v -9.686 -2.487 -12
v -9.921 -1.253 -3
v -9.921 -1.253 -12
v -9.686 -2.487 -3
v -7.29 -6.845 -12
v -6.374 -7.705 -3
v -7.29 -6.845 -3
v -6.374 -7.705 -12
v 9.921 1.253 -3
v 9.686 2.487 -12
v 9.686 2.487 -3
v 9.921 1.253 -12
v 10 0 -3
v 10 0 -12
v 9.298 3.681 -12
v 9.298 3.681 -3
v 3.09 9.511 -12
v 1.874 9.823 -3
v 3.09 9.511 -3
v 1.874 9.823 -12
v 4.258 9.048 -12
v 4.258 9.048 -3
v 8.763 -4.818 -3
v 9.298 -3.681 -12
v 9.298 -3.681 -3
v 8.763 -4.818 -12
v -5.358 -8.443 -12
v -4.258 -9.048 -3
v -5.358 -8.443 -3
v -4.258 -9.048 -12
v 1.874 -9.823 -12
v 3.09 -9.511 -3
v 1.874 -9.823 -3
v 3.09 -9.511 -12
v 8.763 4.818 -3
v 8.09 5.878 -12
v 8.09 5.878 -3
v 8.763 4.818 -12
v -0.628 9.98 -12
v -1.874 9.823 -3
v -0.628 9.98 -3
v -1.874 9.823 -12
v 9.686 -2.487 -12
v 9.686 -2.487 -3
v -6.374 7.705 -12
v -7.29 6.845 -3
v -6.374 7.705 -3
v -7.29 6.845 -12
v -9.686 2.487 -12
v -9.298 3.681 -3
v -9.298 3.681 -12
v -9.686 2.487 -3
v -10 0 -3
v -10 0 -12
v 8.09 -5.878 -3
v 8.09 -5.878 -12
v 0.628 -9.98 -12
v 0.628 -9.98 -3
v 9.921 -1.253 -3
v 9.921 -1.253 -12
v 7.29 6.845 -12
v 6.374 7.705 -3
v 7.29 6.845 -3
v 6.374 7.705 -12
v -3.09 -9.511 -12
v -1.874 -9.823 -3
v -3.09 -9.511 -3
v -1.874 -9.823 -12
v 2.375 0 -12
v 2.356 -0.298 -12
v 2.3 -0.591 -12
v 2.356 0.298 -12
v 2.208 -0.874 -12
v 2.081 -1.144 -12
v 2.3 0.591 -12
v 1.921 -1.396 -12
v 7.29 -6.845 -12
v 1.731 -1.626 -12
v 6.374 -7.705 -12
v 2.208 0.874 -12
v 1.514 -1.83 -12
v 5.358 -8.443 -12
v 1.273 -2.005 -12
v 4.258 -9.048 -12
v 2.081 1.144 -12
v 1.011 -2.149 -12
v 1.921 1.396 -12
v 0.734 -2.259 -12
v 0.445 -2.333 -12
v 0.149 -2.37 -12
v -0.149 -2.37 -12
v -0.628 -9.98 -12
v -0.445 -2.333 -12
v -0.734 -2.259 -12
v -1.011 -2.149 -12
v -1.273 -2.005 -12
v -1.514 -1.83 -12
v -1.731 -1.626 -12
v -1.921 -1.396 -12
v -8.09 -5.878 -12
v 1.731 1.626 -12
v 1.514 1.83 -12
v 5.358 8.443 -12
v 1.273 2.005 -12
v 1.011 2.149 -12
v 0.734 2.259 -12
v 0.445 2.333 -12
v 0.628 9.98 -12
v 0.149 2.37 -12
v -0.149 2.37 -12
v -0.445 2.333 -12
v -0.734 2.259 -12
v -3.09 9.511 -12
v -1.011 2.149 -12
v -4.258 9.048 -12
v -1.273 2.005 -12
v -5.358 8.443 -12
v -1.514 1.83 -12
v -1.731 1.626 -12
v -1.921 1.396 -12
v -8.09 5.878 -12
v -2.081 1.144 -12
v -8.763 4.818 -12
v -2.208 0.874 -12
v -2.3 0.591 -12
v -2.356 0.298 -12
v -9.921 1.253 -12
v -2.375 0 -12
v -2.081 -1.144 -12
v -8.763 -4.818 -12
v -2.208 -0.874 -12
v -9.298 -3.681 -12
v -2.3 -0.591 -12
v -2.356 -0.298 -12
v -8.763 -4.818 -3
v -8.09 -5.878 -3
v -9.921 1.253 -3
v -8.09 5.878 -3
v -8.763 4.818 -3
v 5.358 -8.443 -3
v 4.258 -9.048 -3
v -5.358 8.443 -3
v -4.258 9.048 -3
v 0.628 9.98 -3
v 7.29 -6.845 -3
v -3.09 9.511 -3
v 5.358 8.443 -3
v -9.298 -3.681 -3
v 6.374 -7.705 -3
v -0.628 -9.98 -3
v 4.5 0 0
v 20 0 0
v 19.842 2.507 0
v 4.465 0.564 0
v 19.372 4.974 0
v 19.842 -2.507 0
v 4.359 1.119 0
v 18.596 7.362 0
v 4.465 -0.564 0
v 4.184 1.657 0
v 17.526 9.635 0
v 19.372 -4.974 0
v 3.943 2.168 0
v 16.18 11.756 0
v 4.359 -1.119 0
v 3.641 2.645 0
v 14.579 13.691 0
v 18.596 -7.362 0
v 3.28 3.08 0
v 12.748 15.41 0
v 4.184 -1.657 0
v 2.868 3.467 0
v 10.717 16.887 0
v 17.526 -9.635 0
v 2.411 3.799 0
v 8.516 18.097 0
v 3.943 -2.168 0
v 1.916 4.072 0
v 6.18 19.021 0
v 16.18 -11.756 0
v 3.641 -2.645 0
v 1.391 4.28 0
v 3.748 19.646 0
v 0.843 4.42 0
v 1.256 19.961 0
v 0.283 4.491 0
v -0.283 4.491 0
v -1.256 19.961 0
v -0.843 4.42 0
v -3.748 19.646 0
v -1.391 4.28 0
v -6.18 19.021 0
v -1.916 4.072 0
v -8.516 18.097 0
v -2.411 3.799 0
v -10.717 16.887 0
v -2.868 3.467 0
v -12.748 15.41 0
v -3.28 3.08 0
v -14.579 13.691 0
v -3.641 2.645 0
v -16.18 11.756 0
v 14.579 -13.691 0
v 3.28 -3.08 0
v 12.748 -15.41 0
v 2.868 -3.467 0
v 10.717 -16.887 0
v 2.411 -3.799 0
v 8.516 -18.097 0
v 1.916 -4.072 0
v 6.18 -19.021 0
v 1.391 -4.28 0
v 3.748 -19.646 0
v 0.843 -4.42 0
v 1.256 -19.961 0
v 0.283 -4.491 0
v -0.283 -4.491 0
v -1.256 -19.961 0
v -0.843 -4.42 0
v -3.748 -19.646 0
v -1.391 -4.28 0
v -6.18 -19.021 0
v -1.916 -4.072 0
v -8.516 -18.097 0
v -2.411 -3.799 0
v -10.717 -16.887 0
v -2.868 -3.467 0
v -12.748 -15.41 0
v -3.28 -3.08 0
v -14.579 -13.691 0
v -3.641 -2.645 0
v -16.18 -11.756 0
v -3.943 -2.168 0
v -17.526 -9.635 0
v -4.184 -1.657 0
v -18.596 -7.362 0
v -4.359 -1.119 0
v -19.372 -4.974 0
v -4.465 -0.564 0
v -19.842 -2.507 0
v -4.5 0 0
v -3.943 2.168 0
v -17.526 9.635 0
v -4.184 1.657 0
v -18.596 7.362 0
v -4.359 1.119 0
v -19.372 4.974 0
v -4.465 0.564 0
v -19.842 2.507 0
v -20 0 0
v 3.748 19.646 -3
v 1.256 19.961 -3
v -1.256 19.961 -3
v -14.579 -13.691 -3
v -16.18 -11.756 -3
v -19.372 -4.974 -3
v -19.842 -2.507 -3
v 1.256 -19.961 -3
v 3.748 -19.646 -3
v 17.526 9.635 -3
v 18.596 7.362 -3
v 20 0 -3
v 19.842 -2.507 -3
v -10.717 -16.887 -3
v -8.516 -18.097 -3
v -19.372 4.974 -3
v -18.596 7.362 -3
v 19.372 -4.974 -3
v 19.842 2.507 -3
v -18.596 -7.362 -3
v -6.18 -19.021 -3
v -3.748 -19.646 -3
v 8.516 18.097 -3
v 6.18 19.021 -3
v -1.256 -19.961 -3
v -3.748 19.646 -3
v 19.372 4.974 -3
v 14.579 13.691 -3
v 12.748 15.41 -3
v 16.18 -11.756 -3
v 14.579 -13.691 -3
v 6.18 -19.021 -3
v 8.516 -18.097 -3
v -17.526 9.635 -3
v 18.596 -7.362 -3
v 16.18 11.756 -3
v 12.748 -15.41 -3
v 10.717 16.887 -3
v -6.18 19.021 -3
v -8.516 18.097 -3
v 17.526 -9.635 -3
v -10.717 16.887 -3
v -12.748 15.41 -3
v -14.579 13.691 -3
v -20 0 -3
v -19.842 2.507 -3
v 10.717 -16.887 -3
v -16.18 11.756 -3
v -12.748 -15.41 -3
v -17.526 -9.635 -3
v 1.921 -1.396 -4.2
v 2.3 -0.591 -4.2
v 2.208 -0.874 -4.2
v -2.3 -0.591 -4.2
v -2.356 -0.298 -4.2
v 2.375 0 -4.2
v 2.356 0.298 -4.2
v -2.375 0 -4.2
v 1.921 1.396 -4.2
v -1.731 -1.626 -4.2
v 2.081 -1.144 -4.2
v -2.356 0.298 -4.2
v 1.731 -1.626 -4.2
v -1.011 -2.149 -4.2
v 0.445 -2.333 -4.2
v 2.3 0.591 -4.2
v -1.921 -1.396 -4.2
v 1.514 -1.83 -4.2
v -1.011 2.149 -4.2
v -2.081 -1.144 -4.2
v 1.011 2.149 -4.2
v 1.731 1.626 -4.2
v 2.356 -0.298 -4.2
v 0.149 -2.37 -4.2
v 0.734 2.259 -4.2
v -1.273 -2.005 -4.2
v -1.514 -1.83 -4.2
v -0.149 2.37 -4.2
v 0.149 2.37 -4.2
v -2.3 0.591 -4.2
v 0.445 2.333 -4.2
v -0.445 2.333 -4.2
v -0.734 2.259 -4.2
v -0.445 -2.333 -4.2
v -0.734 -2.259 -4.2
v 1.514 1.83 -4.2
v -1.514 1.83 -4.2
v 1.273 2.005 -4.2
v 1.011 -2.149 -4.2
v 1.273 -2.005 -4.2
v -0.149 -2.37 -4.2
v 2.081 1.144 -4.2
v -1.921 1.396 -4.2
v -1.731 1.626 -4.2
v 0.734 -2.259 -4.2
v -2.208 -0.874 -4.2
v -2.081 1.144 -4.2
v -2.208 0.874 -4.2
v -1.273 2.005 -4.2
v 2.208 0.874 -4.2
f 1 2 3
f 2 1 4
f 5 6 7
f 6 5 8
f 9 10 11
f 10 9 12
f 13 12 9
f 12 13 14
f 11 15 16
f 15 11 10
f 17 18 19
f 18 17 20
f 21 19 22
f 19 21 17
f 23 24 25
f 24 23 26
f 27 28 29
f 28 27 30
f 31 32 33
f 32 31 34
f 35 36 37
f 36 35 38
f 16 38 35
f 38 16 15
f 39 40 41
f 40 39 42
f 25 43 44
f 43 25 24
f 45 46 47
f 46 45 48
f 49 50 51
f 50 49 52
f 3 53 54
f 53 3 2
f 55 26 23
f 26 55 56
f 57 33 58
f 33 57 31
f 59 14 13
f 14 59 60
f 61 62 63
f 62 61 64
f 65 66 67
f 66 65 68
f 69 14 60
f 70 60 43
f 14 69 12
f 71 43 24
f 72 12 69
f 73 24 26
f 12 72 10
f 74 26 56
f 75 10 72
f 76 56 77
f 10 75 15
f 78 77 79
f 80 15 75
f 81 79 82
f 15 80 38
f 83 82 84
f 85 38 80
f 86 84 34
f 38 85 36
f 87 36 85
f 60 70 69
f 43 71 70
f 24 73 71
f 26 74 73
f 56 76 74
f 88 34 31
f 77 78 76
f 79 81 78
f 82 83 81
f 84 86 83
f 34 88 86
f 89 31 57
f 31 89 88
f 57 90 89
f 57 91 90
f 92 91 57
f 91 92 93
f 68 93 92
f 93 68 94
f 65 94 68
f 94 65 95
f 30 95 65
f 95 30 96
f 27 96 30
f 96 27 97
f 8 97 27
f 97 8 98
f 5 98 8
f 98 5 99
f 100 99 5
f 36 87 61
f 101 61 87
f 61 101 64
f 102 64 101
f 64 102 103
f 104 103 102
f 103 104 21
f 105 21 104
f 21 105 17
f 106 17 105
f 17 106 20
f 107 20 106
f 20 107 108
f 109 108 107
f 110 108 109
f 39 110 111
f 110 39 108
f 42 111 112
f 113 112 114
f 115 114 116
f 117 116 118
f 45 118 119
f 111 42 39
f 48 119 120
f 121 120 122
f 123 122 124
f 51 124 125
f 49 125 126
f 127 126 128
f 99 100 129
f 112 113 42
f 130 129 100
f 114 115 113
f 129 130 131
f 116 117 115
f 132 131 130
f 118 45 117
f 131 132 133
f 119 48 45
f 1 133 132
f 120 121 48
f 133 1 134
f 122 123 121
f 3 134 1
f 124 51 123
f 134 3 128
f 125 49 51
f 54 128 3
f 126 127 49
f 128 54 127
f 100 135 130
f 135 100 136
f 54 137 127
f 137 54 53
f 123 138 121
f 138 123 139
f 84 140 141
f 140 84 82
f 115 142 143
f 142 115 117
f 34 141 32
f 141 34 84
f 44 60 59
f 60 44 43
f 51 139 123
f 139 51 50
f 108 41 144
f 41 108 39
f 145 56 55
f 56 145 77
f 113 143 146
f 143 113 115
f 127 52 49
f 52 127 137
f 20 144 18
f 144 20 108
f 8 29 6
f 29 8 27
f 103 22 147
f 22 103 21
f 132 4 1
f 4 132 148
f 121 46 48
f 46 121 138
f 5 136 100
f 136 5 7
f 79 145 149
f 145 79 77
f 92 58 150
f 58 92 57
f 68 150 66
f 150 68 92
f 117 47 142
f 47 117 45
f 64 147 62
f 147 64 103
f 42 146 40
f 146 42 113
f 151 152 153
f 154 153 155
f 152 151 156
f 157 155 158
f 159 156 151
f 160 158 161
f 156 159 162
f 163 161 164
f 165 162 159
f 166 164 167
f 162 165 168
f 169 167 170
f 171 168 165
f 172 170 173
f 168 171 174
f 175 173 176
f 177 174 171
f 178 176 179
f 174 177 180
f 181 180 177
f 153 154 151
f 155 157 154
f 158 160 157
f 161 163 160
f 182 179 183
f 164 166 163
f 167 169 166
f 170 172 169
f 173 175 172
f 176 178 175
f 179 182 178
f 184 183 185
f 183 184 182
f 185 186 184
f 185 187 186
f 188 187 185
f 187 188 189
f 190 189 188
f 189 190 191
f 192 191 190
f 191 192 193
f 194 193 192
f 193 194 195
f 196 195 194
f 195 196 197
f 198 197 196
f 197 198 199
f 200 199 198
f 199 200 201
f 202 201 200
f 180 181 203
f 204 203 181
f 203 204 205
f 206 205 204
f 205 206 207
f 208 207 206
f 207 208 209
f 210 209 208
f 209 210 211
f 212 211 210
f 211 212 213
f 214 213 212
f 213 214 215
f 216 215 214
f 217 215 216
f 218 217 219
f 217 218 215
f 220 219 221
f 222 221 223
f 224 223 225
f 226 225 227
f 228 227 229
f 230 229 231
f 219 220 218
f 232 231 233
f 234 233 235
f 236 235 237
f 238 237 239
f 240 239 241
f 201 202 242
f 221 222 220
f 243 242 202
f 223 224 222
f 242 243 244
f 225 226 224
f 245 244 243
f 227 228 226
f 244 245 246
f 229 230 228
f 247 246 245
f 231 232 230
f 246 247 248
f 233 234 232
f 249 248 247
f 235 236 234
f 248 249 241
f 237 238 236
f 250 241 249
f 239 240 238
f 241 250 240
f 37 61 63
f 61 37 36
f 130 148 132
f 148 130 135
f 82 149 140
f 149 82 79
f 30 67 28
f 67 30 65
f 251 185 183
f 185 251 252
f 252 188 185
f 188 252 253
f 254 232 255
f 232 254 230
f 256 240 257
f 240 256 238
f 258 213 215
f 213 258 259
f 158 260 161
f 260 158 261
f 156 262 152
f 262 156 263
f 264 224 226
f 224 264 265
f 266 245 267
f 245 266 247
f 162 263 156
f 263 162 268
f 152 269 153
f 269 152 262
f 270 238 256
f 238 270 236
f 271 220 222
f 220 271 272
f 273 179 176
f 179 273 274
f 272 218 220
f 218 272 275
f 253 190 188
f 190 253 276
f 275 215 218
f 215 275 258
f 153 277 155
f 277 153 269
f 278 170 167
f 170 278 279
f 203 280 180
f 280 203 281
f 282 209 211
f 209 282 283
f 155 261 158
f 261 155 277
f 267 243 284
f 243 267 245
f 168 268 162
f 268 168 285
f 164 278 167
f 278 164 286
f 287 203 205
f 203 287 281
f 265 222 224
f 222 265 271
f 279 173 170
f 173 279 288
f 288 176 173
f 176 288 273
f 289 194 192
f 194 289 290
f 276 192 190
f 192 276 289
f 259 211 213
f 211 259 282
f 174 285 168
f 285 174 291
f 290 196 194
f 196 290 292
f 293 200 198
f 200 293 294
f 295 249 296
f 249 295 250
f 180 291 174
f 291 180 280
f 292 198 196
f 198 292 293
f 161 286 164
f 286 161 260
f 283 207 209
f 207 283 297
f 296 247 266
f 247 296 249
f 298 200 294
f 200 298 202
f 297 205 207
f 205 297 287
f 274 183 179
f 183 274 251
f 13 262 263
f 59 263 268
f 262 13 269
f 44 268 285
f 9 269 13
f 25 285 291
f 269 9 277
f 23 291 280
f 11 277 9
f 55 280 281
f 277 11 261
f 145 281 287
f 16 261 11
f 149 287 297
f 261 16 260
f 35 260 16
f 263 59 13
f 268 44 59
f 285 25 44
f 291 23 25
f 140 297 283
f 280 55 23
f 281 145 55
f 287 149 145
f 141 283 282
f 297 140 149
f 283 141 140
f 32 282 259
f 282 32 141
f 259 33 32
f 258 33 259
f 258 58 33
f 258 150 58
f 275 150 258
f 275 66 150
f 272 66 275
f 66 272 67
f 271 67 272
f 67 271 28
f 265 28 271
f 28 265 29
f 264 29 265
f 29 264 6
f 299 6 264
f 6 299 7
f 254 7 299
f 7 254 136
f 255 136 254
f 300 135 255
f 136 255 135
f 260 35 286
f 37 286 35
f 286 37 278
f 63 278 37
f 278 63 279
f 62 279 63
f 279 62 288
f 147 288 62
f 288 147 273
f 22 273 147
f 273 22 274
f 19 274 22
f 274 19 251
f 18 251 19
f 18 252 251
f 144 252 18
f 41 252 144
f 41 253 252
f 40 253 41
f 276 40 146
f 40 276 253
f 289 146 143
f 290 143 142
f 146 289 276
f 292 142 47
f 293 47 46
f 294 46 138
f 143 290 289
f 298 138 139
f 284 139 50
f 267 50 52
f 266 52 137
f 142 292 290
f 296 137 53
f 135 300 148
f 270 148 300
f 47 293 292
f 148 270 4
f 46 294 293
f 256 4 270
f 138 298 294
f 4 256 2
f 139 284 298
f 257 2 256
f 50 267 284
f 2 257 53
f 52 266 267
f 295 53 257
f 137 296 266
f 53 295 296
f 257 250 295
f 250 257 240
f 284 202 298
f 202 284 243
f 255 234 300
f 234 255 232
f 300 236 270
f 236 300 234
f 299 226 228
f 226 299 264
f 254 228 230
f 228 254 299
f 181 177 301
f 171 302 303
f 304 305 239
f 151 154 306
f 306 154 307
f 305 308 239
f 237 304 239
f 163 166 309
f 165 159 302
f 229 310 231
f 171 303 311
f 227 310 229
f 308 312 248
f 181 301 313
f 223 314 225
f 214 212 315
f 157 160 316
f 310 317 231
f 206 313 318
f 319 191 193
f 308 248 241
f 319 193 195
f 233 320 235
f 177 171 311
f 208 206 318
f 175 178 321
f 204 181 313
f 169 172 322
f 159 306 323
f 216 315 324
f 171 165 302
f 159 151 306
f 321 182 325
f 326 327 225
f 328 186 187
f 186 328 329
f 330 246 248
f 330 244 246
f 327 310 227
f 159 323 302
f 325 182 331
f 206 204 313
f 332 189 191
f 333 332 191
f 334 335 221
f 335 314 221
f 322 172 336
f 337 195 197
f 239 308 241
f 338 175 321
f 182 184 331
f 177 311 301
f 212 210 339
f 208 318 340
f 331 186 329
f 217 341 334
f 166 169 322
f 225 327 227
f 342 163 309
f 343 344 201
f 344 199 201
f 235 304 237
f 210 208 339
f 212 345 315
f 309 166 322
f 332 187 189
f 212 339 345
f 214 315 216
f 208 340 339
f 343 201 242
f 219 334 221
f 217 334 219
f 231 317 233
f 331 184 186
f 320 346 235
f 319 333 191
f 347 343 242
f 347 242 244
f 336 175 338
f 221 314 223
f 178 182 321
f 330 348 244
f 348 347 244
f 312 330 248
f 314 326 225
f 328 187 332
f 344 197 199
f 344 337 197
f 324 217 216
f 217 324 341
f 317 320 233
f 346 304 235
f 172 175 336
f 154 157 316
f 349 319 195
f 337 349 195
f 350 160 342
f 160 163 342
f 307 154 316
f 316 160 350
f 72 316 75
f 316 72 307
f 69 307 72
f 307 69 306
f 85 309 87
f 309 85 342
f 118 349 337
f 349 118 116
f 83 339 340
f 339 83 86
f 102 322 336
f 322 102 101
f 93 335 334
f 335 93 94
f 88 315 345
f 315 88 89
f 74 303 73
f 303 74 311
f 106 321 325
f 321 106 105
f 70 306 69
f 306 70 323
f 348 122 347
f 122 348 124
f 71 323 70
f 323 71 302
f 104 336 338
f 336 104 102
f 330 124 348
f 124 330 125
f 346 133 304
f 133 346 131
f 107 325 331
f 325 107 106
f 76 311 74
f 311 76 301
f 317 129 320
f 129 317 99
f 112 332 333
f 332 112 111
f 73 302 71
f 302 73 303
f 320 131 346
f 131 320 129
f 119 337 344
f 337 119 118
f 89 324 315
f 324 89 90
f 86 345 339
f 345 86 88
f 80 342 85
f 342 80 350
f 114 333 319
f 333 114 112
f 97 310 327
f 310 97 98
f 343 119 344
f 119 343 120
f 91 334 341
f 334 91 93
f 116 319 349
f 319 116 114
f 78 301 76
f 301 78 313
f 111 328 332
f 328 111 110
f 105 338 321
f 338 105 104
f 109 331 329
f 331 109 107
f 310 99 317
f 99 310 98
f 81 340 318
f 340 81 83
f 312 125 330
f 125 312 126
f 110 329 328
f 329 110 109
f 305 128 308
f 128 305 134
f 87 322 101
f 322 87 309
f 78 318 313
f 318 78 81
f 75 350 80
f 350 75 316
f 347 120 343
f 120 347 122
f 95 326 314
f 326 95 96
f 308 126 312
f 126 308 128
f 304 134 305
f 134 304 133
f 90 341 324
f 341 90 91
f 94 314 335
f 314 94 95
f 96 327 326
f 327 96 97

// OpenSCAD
$fn = 50;


difference() {
	union() {
		translate(v = [0, 0, -12.0000000000]) {
			cylinder(h = 12, r = 10.0000000000);
		}
		translate(v = [0, 0, -3.0000000000]) {
			cylinder(h = 3, r = 20.0000000000);
		}
	}
	union() {
		translate(v = [0, 0, 0]) {
			rotate(a = [0, 0, 0]) {
				difference() {
					union() {
						#translate(v = [0, 0, -12.0000000000]) {
							cylinder(h = 12, r = 2.2500000000);
						}
						#translate(v = [0, 0, -4.2000000000]) {
							cylinder(h = 4.2000000000, r1 = 2.3750000000, r2 = 4.5000000000);
						}
						#translate(v = [0, 0, -12.0000000000]) {
							cylinder(h = 12, r = 2.3750000000);
						}
						#translate(v = [0, 0, -12.0000000000]) {
							cylinder(h = 12, r = 2.2500000000);
						}
					}
					union();
				}
			}
		}
	}
}
